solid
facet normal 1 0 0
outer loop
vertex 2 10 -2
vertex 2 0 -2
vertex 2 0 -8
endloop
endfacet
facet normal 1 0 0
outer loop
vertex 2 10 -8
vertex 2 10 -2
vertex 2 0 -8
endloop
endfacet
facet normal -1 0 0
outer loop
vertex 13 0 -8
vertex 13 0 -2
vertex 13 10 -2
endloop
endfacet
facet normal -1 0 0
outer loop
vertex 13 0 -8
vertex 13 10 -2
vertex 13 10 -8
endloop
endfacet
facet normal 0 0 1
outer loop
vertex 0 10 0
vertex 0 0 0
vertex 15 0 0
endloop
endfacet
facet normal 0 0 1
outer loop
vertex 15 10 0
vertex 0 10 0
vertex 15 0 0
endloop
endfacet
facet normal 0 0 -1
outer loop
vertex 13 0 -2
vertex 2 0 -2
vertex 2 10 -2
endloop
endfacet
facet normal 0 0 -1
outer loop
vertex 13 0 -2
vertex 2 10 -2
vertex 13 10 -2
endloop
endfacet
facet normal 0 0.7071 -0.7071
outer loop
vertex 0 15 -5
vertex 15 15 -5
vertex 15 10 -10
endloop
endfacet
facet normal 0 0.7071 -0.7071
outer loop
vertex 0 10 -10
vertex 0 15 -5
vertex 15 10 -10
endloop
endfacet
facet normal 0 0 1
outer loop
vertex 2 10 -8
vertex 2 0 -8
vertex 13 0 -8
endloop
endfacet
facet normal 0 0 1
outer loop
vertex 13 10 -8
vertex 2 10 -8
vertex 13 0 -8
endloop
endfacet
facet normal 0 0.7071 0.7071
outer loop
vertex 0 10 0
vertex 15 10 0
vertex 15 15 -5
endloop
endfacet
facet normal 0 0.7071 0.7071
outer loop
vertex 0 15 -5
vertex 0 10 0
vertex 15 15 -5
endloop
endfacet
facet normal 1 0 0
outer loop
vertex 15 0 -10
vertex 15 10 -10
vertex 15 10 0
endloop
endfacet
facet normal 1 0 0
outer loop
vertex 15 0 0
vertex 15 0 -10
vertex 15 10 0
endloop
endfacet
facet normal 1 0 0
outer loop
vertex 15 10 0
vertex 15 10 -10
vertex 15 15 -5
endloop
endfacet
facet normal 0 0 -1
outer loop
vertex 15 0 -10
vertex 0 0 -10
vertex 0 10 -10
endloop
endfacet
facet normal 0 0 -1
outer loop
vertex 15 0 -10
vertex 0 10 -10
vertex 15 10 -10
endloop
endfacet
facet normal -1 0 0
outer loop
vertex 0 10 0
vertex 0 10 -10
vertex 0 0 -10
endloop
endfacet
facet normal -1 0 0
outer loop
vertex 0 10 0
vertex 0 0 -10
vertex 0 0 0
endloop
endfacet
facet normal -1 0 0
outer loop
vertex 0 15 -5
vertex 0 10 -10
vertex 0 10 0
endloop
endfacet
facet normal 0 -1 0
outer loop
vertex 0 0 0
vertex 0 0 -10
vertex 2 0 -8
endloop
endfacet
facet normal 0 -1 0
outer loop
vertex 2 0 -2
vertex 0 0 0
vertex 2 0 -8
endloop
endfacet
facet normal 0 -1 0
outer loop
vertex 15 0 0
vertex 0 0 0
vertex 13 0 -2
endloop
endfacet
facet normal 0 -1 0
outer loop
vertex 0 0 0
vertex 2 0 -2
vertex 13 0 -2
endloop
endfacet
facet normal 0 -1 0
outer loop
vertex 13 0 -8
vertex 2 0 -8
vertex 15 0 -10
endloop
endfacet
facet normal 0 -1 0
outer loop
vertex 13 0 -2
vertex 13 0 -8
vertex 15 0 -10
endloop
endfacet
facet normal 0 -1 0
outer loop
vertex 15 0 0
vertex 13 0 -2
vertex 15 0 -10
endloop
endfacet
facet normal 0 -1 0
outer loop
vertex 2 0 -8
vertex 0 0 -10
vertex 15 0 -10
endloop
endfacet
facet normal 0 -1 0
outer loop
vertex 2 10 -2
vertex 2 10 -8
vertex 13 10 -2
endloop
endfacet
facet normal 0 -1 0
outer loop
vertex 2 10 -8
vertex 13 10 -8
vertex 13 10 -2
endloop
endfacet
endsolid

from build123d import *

# Parameters (mm, degrees)
SKETCH1_W           = 15
SKETCH1_H           = 10
SKETCH1_W_2         = 11
SKETCH1_H_2         = 6
BOSS_EXTRUDE1_DEPTH = 10
BOSS_EXTRUDE2_DEPTH = 15


with BuildPart() as part:
    # Sketch1 → Boss-Extrude1 (new body)
    with BuildSketch(Plane(origin=(0, 0, 0), x_dir=(1, 0, 0), z_dir=(0, 1, 0))):
        with Locations((7.5, 5)):
            Rectangle(SKETCH1_W, SKETCH1_H)
        with Locations((7.5, 5)):
            Rectangle(SKETCH1_W_2, SKETCH1_H_2, mode=Mode.SUBTRACT)
    extrude(amount=BOSS_EXTRUDE1_DEPTH)

    # Sketch2 → Boss-Extrude2 (add)
    with BuildSketch(Plane(origin=(15, 0, 0), x_dir=(0, 0, -1), z_dir=(1, 0, 0))):
        Polygon((0, 10), (5, 15), (10, 10), align=None)
    extrude(amount=-BOSS_EXTRUDE2_DEPTH)


solid = part.part
